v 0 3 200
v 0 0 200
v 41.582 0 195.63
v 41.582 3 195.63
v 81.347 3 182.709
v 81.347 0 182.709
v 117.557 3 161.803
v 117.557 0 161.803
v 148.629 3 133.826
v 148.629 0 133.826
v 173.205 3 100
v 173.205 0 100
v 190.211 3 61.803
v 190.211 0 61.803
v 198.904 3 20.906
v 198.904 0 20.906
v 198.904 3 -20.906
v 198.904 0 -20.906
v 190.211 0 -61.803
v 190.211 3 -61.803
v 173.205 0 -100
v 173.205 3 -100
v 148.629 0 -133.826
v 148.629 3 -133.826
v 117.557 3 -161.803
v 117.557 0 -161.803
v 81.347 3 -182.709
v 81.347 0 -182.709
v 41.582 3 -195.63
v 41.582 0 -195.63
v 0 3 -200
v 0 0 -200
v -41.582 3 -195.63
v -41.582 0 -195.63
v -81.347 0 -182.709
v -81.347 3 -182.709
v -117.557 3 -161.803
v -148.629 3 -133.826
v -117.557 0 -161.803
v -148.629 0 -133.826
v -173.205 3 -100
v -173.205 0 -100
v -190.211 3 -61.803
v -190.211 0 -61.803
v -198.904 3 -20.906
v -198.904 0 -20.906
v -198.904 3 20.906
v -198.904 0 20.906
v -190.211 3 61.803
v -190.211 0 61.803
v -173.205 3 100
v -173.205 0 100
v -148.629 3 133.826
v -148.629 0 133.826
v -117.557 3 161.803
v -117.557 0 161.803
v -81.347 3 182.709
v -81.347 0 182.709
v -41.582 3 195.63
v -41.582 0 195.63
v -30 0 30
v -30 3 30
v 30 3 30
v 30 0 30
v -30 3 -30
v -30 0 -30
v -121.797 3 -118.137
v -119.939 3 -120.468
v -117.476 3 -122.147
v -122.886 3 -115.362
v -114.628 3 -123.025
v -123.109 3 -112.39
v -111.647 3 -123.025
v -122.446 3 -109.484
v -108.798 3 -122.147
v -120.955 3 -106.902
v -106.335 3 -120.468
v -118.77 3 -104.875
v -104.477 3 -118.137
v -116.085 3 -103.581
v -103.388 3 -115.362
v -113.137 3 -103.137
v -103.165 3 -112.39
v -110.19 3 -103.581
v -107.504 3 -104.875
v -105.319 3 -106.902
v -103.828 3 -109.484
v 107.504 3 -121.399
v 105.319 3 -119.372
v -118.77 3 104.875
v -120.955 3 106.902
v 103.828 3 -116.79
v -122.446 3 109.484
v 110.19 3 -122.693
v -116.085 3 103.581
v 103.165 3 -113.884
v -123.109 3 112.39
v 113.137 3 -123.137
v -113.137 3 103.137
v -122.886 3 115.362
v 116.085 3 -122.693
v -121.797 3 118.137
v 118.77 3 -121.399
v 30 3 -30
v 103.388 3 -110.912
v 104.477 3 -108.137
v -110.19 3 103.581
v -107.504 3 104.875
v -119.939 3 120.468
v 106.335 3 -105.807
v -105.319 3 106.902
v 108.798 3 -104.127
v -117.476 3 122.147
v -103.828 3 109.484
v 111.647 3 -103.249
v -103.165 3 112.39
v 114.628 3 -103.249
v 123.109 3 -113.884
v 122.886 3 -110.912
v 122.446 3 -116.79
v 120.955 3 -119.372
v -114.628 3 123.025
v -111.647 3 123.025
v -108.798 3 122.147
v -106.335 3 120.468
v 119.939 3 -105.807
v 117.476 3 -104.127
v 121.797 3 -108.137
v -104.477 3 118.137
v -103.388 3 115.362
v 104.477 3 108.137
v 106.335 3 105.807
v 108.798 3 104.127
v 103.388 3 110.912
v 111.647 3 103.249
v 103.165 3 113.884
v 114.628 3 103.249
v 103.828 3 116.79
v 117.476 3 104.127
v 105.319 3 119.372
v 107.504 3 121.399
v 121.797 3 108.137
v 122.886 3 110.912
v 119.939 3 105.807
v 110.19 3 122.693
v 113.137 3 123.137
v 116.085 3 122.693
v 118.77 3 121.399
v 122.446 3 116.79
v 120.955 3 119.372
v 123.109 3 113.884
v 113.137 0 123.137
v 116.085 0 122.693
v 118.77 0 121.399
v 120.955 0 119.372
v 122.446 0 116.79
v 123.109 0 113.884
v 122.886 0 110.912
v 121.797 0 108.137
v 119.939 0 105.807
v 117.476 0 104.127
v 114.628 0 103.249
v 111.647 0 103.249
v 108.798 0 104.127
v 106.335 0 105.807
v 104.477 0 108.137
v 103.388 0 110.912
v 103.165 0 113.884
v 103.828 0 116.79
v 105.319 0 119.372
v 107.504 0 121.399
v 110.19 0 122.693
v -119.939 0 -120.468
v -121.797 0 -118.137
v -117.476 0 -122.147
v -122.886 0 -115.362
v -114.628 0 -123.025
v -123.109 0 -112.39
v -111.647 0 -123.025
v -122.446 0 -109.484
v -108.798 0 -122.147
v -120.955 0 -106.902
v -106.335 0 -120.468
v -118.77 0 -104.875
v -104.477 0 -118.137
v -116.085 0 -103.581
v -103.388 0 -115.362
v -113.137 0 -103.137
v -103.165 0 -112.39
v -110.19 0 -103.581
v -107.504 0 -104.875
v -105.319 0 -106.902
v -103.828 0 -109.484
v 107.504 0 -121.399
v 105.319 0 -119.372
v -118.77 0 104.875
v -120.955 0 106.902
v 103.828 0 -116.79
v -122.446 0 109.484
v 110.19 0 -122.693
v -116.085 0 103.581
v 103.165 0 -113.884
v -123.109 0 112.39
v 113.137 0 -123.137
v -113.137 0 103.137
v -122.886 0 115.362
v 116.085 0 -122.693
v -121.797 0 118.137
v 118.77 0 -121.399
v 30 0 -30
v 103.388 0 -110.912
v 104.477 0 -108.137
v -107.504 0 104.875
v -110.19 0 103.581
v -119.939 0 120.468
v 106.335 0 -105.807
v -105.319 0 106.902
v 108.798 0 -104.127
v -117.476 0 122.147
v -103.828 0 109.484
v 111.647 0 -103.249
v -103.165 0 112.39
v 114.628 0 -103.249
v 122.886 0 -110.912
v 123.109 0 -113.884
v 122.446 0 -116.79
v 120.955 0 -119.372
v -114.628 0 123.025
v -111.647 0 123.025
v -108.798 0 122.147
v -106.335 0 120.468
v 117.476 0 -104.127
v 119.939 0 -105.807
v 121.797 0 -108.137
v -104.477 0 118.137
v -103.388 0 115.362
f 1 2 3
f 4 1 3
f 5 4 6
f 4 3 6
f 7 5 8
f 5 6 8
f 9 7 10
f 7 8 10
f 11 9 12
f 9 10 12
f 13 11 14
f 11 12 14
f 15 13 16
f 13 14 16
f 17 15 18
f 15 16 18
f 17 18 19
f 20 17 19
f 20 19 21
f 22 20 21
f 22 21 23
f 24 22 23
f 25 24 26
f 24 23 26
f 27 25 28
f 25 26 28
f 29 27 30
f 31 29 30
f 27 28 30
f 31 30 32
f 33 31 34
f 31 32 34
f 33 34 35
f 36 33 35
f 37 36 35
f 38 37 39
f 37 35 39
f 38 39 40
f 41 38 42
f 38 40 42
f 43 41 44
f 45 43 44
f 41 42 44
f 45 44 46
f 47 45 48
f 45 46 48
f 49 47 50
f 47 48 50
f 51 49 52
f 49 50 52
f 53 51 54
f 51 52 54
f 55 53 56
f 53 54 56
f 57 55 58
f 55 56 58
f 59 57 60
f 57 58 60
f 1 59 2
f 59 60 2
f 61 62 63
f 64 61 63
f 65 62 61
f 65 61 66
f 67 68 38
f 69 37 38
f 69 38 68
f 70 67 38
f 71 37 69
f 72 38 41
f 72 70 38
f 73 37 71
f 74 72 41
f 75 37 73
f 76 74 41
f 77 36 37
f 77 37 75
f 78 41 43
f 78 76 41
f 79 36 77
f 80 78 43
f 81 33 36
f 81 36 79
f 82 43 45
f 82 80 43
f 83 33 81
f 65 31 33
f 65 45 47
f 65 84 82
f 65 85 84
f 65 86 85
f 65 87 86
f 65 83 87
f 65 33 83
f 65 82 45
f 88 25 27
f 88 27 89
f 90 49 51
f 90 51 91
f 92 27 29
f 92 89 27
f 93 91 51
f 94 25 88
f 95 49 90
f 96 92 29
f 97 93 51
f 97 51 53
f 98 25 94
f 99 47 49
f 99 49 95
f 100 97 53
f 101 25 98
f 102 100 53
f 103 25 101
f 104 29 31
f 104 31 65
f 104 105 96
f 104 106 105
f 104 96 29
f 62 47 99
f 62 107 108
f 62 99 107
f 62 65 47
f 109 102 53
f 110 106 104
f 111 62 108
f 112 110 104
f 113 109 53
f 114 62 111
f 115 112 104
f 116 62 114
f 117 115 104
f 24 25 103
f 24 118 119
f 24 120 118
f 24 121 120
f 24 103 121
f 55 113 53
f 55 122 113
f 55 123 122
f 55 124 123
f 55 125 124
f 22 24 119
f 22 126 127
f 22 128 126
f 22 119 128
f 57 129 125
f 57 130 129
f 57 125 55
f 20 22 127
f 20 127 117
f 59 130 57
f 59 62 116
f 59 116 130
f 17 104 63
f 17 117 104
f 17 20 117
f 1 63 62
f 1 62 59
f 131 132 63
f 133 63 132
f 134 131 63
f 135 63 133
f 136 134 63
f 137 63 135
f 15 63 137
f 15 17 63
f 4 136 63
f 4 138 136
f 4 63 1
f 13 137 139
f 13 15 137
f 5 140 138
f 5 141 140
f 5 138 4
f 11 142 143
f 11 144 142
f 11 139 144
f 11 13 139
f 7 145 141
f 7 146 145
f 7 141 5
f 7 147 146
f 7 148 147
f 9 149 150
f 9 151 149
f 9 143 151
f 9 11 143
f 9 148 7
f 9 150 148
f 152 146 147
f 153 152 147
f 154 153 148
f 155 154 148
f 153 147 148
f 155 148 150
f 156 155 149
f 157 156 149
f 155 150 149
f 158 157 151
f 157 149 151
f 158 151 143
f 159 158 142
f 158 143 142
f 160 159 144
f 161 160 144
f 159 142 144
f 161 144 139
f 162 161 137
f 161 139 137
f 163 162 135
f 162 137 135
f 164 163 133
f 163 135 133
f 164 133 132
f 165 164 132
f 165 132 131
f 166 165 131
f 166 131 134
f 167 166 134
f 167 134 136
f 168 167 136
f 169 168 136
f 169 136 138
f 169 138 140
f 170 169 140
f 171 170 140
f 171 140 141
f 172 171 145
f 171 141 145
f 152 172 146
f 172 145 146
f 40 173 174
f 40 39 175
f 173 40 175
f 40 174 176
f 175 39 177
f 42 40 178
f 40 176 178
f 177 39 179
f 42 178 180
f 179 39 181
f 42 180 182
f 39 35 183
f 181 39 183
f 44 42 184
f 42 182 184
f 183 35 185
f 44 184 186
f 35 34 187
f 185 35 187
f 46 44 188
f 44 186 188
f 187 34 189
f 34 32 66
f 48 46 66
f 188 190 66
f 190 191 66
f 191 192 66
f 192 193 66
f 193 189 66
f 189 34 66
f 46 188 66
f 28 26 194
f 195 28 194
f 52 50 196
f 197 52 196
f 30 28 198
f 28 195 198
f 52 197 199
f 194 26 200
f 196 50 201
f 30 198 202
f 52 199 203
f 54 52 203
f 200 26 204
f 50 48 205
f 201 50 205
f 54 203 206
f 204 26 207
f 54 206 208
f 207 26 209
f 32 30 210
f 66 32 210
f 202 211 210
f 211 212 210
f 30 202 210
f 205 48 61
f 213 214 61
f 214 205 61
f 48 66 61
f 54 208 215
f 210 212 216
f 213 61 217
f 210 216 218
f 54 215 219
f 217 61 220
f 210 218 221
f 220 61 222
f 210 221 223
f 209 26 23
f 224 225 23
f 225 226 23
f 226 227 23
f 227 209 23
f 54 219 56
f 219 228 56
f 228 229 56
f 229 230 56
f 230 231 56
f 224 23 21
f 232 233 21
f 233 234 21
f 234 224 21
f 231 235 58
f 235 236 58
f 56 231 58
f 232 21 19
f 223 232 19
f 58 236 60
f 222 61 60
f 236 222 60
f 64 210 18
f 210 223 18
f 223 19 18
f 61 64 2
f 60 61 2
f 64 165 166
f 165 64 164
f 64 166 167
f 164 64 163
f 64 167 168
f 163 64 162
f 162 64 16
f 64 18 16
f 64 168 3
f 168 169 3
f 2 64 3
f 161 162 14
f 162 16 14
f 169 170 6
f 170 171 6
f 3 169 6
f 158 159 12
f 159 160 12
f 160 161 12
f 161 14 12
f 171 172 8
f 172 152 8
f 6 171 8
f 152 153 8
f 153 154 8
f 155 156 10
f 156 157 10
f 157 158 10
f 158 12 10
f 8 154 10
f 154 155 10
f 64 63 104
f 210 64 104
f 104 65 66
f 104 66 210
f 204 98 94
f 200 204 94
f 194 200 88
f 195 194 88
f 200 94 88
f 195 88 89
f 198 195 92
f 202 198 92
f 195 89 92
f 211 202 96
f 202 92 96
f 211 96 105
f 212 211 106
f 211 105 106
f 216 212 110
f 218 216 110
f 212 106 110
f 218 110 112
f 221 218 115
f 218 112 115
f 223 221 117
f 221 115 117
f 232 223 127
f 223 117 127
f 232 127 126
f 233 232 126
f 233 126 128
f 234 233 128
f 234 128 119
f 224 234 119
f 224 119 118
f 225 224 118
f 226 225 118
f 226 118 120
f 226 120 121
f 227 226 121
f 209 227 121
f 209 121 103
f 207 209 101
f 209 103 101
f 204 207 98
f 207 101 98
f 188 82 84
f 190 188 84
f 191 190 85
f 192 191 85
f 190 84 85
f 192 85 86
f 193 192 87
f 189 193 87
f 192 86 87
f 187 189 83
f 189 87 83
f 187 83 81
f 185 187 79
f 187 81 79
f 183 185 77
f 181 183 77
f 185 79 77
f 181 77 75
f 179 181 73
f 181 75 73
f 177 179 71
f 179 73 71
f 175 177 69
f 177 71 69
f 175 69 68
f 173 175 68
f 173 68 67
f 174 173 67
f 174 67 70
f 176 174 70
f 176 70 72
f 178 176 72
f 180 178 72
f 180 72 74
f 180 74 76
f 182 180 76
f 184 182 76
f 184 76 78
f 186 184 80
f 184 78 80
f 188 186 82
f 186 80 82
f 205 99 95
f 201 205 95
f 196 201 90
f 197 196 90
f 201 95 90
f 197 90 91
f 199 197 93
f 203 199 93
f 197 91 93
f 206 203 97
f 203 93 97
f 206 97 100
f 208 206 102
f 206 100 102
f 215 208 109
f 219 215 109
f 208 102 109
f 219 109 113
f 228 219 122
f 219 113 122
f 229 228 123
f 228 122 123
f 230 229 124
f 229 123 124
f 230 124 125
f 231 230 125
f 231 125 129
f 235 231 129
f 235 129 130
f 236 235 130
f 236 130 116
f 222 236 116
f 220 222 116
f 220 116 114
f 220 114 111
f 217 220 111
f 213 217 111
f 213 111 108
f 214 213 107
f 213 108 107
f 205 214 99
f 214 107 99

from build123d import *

# Parameters (mm, degrees)
SKETCH_1_R          = 200
EXTRUDE_1_DEPTH     = 3
SKETCH_2_R          = 10
CUT_EXTRUDE_1_DEPTH = 3
SKETCH_3_W          = 60
SKETCH_3_H          = 60
CUT_EXTRUDE_2_DEPTH = 3


with BuildPart() as part:
    # 草图1 → 凸台-拉伸1 (new body)
    with BuildSketch(Plane(origin=(0, 0, 0), x_dir=(1, 0, 0), z_dir=(0, 1, 0))):
        with Locations(Location((0, 0, 0), (0, 0, 270))):
            Circle(SKETCH_1_R)
    extrude(amount=EXTRUDE_1_DEPTH)

    # 草图2 → 切除-拉伸1 (cut)
    with BuildSketch(Plane(origin=(0, 3, 0), x_dir=(1, 0, 0), z_dir=(0, 1, 0))):
        with Locations(Location((-113.13708499, 113.13708499, 0), (0, 0, 270))):
            Circle(SKETCH_2_R)
        with Locations(Location((-113.13708499, -113.13708499, 0), (0, 0, 90))):
            Circle(SKETCH_2_R)
        with Locations(Location((113.13708499, -113.13708499, 0), (0, 0, 270))):
            Circle(SKETCH_2_R)
        with Locations(Location((113.13708499, 113.13708499, 0), (0, 0, 90))):
            Circle(SKETCH_2_R)
    extrude(amount=-CUT_EXTRUDE_1_DEPTH, mode=Mode.SUBTRACT)

    # 草图3 → 切除-拉伸2 (cut)
    with BuildSketch(Plane(origin=(0, 3, 0), x_dir=(1, 0, 0), z_dir=(0, 1, 0))):
        Rectangle(SKETCH_3_W, SKETCH_3_H)
    extrude(amount=-CUT_EXTRUDE_2_DEPTH, mode=Mode.SUBTRACT)


solid = part.part
